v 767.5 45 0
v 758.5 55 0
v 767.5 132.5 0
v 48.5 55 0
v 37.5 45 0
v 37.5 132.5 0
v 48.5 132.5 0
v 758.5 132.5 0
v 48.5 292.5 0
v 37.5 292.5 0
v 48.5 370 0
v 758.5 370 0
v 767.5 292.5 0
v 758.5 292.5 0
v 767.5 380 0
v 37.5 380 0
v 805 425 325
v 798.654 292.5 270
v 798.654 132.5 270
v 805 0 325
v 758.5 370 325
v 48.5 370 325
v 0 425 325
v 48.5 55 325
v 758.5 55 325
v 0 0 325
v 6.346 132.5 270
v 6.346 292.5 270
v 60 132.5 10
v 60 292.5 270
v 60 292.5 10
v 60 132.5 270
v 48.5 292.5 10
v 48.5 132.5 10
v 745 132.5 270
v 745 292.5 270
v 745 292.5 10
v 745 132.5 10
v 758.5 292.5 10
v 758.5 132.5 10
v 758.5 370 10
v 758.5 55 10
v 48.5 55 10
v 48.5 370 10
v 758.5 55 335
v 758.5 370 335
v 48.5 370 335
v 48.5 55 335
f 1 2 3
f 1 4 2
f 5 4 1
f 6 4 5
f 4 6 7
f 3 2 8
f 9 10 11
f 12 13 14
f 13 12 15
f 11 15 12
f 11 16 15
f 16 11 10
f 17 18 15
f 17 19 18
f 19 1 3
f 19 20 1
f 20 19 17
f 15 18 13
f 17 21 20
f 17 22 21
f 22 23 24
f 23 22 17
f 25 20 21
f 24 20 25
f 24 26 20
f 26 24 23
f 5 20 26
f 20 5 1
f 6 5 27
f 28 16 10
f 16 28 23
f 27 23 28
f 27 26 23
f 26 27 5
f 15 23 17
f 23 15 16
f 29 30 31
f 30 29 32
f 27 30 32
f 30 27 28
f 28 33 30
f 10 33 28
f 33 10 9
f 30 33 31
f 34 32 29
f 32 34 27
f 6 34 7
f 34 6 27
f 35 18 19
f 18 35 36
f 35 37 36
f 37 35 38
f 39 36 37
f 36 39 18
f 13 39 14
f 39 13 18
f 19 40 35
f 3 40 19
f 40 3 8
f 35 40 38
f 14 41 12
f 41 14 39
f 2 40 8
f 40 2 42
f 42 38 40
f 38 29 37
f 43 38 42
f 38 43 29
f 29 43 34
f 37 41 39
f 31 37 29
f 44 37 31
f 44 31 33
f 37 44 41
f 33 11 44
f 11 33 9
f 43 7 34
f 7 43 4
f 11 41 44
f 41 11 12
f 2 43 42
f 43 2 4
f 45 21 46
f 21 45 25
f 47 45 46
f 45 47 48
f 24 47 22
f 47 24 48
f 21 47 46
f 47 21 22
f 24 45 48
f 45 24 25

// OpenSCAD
// Keter/Allibert Voyager 65l

ix = 37.5;
iy = 45;
difference() {
    polyhedron(
        points = [
            // bottom
            [   0+ix,   0+iy,   0 ], // 0
            [ 730+ix,   0+iy,   0 ], // 1
            [ 730+ix, 335+iy,   0 ], // 2
            [   0+ix, 335+iy,   0 ], // 3

            // top
            [   0   ,   0   , 325 ], // 4
            [ 805   ,   0   , 325 ], // 5
            [ 805   , 425   , 325 ], // 6
            [   0   , 425   , 325 ], // 7
        ],

        faces = [
            [0,1,2,3],  // bottom
            [4,5,1,0],  // front
            [7,6,5,4],  // top
            [5,6,2,1],  // right
            [6,7,3,2],  // back
            [7,4,0,3] // left
        ]
    );

    translate([0,132.5,0]) cube([22.5+ix,160,270]);
    translate([745,132.5,0]) cube([22.5+ix,160,270]);

    translate([48.5,55,0]) cube([710,315,10]);
}

translate([48.5,55,325]) cube([710,315,10]);
